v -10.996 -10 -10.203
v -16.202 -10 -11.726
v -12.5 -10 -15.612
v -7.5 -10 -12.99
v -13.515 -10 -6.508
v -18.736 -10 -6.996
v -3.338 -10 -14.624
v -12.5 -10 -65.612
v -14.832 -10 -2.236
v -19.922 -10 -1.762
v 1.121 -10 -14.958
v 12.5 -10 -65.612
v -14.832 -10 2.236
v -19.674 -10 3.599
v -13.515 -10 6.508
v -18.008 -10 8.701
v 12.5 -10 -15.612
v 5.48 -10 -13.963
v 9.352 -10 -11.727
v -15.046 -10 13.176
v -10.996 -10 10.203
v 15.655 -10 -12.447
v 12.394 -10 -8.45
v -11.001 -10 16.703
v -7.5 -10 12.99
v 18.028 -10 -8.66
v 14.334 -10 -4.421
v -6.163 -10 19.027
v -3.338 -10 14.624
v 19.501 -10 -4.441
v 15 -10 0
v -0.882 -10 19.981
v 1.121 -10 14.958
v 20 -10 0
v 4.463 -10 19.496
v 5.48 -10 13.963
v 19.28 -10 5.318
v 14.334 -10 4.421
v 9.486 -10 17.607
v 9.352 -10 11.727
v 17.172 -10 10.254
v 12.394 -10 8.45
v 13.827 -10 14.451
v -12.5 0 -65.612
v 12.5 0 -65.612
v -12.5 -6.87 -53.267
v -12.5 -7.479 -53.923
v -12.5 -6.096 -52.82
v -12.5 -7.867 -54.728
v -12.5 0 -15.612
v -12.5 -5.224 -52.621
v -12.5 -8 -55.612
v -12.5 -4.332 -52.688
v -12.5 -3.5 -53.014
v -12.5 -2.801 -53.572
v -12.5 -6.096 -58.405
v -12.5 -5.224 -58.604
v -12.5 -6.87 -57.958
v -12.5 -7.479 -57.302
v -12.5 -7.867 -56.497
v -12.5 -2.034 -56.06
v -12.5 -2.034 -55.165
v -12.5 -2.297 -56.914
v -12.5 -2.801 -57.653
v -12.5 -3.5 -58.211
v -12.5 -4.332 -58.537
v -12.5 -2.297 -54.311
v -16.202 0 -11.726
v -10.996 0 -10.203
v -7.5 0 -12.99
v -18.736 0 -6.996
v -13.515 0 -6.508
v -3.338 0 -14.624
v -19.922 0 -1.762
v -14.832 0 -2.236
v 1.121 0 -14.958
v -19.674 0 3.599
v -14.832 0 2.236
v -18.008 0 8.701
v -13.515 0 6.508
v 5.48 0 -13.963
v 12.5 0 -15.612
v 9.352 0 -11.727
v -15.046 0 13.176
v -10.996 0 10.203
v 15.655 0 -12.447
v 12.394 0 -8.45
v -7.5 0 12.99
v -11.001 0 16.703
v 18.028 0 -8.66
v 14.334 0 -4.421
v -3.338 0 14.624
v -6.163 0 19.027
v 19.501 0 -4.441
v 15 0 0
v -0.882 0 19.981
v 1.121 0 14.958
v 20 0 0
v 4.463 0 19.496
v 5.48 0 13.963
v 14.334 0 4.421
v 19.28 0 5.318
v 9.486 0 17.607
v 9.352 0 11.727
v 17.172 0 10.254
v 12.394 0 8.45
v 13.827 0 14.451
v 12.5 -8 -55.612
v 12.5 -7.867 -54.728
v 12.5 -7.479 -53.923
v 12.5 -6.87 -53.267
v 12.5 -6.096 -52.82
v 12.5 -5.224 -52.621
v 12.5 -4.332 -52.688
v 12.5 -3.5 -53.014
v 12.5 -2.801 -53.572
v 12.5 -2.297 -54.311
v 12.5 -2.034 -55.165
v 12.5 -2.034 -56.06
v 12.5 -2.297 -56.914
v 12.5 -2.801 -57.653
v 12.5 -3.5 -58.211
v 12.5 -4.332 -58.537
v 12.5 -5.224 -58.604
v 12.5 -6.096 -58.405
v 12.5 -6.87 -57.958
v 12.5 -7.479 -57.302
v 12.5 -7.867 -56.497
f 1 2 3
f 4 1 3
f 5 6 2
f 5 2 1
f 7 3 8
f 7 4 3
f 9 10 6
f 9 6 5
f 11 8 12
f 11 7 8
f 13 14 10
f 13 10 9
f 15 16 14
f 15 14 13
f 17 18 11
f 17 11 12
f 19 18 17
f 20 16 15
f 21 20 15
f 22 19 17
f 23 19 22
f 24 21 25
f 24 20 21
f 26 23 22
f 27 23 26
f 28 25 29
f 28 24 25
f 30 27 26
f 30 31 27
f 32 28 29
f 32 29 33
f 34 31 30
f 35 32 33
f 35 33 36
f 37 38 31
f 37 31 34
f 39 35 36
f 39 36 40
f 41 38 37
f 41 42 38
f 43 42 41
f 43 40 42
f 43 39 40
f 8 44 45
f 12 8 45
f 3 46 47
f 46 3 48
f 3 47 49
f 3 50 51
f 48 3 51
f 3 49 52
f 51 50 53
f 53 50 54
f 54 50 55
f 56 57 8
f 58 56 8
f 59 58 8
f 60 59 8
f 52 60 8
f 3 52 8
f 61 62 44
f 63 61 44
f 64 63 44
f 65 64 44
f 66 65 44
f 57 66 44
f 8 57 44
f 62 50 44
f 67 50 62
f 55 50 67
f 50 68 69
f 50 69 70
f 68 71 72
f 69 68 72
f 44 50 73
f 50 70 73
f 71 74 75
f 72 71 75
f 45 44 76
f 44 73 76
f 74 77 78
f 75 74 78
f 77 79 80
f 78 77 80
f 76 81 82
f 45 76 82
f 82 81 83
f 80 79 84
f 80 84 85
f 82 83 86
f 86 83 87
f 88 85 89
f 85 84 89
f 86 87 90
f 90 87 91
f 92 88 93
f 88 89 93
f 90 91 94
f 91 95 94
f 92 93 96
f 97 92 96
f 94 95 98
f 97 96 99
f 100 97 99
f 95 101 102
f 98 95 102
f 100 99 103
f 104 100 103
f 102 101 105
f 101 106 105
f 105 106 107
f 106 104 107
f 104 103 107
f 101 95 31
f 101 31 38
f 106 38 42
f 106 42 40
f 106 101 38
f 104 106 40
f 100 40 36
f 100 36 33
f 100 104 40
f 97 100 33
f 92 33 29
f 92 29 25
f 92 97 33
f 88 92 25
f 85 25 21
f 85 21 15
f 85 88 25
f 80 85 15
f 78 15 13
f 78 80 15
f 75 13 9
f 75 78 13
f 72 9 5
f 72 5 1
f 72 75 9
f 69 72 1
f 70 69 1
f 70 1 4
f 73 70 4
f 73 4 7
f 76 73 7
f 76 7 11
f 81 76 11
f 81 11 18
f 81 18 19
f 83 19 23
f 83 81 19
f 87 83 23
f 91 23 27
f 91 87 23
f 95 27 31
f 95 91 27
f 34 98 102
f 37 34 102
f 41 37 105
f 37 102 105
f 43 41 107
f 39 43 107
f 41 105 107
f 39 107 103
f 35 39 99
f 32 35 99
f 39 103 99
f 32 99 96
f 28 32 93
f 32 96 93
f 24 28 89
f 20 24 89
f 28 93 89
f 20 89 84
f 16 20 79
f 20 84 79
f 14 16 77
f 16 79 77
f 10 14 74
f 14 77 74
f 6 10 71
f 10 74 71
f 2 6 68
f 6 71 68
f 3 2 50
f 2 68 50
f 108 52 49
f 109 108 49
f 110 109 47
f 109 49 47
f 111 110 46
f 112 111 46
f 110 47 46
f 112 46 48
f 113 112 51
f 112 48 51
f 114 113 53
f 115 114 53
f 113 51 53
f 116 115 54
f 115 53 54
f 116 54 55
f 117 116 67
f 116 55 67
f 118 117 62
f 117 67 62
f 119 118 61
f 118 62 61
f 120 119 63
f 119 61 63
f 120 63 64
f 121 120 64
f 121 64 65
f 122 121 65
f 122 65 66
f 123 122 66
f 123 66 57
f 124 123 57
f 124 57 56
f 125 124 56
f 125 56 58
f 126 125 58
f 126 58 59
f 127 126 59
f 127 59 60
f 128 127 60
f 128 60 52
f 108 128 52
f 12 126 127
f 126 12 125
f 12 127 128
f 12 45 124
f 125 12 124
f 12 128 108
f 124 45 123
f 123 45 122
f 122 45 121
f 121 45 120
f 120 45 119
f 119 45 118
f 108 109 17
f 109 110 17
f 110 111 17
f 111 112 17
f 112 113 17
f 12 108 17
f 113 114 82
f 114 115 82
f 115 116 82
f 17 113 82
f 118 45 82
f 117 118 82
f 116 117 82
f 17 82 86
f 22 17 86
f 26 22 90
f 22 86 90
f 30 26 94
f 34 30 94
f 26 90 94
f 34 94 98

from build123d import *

# Parameters (mm, degrees)
F0_R     = 15
F1_DEPTH = 10
F3_D     = 6


with BuildPart() as f1:
    # F0 (on Front) → F1 (new body)
    with BuildSketch(Plane.XZ):
        with BuildLine():
            ThreePointArc((12.5, -15.612495), (18.027756, -8.660254), (20, 0))
            ThreePointArc((20, 0), (-8.660254, 18.027756), (-12.5, -15.612495))
            Line((-12.5, -15.612495), (12.5, -15.612495))
        make_face()
        Circle(F0_R, mode=Mode.SUBTRACT)
        with BuildLine():
            ThreePointArc((12.5, -15.612495), (0, -20), (-12.5, -15.612495))
            Line((-12.5, -15.612495), (-12.5, -65.612495))
            Line((-12.5, -65.612495), (12.5, -65.612495))
            Line((12.5, -65.612495), (12.5, -15.612495))
        make_face()
        with BuildLine():
            Line((12.5, -15.612495), (-12.5, -15.612495))
            ThreePointArc((-12.5, -15.612495), (0, -20), (12.5, -15.612495))
        make_face()
    extrude(amount=F1_DEPTH)

    # F3 (through all)
    with Locations(Plane.YZ.offset(12.5)):
        with Locations((-5, -55.612495)):
            Hole(F3_D / 2)


solid = f1.part
